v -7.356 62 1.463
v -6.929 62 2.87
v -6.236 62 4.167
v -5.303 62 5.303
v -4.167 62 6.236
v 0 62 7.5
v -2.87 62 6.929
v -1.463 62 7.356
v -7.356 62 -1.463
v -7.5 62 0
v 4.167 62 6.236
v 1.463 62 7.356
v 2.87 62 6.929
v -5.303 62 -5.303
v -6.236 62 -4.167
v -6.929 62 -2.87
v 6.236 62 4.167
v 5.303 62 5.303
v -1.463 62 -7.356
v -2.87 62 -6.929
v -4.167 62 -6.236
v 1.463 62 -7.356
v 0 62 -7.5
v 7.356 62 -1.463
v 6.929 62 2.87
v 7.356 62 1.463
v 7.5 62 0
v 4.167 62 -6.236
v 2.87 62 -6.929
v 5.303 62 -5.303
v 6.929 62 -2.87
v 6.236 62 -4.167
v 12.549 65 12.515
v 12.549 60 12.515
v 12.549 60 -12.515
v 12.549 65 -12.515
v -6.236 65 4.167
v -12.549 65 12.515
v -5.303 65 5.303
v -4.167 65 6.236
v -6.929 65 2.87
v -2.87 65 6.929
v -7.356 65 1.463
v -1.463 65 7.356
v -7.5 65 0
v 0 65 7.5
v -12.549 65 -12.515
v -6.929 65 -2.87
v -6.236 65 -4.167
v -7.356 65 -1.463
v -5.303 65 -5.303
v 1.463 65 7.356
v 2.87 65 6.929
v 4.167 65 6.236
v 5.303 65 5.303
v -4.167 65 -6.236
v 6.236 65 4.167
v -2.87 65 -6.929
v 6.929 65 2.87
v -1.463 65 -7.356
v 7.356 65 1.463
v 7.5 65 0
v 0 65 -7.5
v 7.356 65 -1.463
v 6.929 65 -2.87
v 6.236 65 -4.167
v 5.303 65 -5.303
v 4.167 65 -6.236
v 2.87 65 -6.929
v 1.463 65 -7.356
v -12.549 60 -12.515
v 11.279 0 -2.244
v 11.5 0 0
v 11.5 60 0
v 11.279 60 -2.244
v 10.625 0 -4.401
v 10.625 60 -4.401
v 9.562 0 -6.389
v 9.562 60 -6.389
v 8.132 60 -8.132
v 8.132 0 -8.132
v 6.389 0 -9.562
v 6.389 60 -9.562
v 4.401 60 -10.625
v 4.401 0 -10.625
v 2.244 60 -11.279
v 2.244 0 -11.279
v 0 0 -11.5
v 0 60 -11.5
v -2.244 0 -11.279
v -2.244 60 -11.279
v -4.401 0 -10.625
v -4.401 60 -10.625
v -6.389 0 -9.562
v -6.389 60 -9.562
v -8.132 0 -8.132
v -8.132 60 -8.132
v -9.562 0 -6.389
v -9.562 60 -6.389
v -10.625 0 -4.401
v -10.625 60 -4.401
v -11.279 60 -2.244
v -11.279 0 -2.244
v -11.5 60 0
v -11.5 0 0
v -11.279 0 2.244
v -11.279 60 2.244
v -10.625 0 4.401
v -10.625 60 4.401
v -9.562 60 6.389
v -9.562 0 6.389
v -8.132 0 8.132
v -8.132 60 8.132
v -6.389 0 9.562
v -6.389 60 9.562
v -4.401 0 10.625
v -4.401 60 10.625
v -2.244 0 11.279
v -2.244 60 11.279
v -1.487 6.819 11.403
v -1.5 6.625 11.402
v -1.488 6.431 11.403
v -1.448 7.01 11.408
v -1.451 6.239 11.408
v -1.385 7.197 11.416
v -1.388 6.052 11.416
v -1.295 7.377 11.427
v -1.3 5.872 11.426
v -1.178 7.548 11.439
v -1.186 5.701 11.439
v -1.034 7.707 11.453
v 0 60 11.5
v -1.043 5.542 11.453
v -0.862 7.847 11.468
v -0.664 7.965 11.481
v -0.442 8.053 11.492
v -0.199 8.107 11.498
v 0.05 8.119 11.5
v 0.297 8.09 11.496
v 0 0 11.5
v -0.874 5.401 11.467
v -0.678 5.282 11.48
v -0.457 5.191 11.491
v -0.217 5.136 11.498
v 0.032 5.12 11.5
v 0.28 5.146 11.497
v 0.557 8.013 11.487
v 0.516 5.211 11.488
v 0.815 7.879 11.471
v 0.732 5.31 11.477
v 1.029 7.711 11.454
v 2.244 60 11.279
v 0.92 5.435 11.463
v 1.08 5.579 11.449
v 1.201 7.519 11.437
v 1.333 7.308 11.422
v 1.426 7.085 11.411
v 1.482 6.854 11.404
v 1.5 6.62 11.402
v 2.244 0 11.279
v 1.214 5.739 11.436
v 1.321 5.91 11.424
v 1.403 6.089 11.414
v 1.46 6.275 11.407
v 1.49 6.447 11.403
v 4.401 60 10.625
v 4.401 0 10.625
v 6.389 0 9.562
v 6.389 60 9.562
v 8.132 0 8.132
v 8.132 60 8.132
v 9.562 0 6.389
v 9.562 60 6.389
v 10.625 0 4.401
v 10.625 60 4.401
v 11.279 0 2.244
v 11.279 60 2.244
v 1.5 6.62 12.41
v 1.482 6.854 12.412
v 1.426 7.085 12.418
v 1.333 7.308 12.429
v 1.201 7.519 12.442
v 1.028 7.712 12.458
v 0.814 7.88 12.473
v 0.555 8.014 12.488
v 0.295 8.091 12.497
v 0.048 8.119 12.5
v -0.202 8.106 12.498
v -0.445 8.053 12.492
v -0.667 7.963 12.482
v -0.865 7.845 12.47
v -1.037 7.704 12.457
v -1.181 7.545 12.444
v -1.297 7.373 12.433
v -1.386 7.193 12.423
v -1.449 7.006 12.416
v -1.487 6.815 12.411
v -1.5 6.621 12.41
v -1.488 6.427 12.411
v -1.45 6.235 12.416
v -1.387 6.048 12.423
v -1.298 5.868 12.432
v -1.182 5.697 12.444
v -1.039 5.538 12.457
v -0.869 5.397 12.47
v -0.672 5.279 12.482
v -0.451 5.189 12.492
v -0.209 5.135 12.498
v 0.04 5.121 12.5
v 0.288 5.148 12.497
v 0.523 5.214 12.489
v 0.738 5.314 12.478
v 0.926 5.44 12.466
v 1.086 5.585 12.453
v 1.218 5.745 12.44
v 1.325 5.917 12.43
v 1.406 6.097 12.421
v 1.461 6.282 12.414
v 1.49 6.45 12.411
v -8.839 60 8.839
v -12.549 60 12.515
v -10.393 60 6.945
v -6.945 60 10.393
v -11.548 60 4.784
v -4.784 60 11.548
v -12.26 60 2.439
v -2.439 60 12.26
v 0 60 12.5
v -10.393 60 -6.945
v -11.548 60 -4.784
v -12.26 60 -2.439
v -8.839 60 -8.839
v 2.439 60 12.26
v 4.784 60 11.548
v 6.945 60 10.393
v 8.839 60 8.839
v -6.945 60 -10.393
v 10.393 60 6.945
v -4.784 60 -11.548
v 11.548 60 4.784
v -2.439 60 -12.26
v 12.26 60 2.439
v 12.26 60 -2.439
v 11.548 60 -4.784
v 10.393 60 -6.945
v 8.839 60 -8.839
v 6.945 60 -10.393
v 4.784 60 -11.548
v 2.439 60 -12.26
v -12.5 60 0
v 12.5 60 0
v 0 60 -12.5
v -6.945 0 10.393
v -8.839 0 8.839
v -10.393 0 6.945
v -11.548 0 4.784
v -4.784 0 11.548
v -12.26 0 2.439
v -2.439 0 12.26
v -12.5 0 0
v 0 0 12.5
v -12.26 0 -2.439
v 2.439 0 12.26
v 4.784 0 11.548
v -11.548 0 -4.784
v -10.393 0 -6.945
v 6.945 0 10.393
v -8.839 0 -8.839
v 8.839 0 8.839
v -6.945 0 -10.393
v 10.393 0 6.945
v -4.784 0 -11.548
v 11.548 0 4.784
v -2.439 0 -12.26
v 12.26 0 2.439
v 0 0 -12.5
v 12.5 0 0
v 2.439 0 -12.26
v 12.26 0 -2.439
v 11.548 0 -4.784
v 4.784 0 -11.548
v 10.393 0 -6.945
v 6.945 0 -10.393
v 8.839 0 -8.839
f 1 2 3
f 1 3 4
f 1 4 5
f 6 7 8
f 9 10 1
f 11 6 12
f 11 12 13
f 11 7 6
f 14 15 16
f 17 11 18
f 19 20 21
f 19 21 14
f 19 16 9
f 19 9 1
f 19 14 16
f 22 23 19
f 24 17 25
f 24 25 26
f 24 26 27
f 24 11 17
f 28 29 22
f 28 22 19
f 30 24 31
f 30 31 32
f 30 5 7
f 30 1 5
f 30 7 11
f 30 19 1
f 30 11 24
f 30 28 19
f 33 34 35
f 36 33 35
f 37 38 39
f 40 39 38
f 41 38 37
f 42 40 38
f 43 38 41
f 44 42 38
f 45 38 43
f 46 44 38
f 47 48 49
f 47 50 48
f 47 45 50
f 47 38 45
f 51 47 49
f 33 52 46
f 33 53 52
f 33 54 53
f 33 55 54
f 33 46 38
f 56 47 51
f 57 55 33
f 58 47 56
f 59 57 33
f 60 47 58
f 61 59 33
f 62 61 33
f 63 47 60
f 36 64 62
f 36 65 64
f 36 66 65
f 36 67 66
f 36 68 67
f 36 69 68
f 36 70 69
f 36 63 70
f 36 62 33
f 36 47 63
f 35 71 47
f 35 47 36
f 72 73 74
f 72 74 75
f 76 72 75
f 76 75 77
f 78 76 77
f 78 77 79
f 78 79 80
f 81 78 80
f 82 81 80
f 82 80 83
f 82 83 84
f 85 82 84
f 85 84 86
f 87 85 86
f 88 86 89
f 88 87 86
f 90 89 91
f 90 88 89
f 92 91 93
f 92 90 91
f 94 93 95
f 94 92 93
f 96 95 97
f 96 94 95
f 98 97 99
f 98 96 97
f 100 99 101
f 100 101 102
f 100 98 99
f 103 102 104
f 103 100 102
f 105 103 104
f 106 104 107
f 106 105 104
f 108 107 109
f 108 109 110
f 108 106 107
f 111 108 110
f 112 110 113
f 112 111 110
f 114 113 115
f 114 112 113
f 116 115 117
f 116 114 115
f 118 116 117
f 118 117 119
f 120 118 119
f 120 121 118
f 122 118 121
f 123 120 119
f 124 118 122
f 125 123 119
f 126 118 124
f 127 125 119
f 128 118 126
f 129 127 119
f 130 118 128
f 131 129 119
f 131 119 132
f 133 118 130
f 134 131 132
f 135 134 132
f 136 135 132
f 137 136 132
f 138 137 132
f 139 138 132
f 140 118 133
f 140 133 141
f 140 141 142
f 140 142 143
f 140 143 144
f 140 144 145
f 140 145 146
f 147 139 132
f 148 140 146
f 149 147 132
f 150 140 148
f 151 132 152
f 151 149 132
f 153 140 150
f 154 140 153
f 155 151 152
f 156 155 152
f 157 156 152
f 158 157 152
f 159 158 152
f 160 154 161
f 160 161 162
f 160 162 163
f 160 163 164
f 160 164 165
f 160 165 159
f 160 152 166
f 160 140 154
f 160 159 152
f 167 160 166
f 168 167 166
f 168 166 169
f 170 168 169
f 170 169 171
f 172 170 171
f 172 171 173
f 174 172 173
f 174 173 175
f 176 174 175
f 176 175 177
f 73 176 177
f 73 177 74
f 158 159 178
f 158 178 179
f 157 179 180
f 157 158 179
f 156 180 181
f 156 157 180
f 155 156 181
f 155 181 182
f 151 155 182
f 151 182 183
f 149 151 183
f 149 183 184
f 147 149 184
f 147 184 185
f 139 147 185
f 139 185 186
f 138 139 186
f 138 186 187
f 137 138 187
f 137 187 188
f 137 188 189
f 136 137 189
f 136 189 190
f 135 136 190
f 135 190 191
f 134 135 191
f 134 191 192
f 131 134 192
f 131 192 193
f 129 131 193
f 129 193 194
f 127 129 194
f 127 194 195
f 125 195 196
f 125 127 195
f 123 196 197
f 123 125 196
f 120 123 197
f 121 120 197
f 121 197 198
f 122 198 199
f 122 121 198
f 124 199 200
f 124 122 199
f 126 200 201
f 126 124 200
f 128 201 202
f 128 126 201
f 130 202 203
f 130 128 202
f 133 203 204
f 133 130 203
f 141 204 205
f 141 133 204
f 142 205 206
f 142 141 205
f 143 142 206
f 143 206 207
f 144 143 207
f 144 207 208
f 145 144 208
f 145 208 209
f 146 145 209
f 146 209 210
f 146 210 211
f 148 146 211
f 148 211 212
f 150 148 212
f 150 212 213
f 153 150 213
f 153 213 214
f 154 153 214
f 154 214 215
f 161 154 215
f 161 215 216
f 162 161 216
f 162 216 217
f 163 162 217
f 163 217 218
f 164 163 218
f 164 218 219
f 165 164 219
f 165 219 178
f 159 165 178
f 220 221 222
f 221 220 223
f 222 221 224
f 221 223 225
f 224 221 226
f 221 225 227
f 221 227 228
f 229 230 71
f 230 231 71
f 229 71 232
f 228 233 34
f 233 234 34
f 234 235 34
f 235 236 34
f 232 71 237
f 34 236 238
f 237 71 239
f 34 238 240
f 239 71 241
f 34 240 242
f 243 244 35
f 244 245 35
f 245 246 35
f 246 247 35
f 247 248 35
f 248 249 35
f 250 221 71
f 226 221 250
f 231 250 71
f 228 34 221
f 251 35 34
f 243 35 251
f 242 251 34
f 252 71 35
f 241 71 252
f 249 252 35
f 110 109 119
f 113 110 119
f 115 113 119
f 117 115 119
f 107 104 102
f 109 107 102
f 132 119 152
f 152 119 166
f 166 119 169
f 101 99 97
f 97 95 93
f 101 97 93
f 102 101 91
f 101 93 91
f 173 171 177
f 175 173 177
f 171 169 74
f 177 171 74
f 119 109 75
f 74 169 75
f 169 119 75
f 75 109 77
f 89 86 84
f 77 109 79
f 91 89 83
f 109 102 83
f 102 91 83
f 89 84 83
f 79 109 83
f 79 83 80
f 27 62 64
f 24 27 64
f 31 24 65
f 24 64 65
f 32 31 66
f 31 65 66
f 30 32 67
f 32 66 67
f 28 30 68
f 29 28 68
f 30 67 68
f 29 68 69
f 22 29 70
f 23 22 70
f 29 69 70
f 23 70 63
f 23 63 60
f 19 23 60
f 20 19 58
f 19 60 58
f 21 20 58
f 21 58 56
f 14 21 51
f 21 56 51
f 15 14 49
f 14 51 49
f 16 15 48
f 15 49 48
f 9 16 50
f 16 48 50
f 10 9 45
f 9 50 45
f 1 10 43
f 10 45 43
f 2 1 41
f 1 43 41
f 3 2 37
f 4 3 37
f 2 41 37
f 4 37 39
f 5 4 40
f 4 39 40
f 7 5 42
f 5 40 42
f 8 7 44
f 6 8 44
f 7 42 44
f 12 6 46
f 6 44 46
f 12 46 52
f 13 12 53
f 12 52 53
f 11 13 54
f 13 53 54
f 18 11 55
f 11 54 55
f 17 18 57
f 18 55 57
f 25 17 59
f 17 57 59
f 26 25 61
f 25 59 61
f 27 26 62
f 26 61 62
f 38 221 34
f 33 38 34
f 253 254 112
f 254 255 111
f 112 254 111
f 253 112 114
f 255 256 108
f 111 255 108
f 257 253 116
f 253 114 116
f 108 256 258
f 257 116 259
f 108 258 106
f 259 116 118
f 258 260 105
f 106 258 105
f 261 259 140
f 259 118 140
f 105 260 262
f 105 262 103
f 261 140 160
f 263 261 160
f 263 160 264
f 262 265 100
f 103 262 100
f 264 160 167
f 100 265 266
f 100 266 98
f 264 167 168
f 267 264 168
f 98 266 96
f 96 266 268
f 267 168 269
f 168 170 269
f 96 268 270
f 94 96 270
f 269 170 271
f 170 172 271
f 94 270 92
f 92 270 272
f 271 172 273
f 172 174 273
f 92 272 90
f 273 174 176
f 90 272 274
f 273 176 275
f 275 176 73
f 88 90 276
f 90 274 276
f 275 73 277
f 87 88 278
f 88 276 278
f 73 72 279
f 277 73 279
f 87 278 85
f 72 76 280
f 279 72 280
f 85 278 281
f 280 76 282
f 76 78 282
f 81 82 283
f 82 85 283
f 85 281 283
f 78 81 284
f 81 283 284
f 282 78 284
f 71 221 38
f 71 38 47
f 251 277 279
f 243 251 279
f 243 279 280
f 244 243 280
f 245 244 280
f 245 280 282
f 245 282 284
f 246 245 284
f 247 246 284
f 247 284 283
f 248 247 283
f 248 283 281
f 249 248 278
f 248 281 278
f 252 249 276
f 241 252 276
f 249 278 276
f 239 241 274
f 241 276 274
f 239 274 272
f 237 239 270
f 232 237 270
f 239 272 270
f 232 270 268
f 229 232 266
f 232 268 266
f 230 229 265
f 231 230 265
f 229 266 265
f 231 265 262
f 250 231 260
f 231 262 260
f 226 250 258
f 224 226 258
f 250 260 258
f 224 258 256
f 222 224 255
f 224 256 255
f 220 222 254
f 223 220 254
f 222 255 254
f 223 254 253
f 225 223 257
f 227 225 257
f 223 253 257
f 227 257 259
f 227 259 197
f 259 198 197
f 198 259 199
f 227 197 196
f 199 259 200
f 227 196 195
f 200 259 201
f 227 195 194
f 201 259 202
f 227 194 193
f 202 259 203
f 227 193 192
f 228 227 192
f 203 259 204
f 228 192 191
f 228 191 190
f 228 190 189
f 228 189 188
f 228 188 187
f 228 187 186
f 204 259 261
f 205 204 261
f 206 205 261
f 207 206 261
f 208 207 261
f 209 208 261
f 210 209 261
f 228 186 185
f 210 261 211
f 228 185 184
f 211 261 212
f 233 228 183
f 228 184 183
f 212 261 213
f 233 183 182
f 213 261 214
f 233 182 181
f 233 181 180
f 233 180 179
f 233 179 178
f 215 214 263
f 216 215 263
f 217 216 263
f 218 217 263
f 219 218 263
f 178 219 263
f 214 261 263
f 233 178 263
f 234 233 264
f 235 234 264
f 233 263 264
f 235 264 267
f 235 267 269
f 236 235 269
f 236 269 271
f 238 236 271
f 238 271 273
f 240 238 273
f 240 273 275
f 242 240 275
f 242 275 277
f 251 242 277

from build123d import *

# Parameters (mm, degrees)
SKETCH1_R           = 12.5
SKETCH1_R_2         = 11.5
BOSS_EXTRUDE1_DEPTH = 60
CUT_EXTRUDE1_REACH  = 14.5
SKETCH2_R           = 1.5
SKETCH3_W           = 25.097425704
SKETCH3_H           = 25.030895612
BOSS_EXTRUDE2_DEPTH = 5
SKETCH4_R           = 7.5
CUT_EXTRUDE2_DEPTH  = 3


with BuildPart() as part:
    # Sketch1 → Boss-Extrude1 (new body)
    with BuildSketch(Plane(origin=(0, 0, 0), x_dir=(1, 0, 0), z_dir=(0, 1, 0))):
        Circle(SKETCH1_R)
        Circle(SKETCH1_R_2, mode=Mode.SUBTRACT)
    extrude(amount=BOSS_EXTRUDE1_DEPTH)

    # Sketch2 → Cut-Extrude1 (cut, up to next)
    with BuildSketch(Plane.XY, mode=Mode.PRIVATE) as cut_extrude1_sk1:
        with Locations((0, 6.62)):
            Circle(SKETCH2_R)
    cut_extrude1_tool1 = extrude(cut_extrude1_sk1.sketch, amount=CUT_EXTRUDE1_REACH, mode=Mode.PRIVATE) & part.part
    add(cut_extrude1_tool1.solids().sort_by_distance((0, 6.62, 0))[0], mode=Mode.SUBTRACT)

    # Sketch3 → Boss-Extrude2 (add)
    with BuildSketch(Plane(origin=(0, 60, 0), x_dir=(1, 0, 0), z_dir=(0, 1, 0))):
        Rectangle(SKETCH3_W, SKETCH3_H)
    extrude(amount=BOSS_EXTRUDE2_DEPTH)

    # Sketch4 → Cut-Extrude2 (cut)
    with BuildSketch(Plane(origin=(0, 65, 0), x_dir=(1, 0, 0), z_dir=(0, 1, 0))):
        Circle(SKETCH4_R)
    extrude(amount=-CUT_EXTRUDE2_DEPTH, mode=Mode.SUBTRACT)


solid = part.part
